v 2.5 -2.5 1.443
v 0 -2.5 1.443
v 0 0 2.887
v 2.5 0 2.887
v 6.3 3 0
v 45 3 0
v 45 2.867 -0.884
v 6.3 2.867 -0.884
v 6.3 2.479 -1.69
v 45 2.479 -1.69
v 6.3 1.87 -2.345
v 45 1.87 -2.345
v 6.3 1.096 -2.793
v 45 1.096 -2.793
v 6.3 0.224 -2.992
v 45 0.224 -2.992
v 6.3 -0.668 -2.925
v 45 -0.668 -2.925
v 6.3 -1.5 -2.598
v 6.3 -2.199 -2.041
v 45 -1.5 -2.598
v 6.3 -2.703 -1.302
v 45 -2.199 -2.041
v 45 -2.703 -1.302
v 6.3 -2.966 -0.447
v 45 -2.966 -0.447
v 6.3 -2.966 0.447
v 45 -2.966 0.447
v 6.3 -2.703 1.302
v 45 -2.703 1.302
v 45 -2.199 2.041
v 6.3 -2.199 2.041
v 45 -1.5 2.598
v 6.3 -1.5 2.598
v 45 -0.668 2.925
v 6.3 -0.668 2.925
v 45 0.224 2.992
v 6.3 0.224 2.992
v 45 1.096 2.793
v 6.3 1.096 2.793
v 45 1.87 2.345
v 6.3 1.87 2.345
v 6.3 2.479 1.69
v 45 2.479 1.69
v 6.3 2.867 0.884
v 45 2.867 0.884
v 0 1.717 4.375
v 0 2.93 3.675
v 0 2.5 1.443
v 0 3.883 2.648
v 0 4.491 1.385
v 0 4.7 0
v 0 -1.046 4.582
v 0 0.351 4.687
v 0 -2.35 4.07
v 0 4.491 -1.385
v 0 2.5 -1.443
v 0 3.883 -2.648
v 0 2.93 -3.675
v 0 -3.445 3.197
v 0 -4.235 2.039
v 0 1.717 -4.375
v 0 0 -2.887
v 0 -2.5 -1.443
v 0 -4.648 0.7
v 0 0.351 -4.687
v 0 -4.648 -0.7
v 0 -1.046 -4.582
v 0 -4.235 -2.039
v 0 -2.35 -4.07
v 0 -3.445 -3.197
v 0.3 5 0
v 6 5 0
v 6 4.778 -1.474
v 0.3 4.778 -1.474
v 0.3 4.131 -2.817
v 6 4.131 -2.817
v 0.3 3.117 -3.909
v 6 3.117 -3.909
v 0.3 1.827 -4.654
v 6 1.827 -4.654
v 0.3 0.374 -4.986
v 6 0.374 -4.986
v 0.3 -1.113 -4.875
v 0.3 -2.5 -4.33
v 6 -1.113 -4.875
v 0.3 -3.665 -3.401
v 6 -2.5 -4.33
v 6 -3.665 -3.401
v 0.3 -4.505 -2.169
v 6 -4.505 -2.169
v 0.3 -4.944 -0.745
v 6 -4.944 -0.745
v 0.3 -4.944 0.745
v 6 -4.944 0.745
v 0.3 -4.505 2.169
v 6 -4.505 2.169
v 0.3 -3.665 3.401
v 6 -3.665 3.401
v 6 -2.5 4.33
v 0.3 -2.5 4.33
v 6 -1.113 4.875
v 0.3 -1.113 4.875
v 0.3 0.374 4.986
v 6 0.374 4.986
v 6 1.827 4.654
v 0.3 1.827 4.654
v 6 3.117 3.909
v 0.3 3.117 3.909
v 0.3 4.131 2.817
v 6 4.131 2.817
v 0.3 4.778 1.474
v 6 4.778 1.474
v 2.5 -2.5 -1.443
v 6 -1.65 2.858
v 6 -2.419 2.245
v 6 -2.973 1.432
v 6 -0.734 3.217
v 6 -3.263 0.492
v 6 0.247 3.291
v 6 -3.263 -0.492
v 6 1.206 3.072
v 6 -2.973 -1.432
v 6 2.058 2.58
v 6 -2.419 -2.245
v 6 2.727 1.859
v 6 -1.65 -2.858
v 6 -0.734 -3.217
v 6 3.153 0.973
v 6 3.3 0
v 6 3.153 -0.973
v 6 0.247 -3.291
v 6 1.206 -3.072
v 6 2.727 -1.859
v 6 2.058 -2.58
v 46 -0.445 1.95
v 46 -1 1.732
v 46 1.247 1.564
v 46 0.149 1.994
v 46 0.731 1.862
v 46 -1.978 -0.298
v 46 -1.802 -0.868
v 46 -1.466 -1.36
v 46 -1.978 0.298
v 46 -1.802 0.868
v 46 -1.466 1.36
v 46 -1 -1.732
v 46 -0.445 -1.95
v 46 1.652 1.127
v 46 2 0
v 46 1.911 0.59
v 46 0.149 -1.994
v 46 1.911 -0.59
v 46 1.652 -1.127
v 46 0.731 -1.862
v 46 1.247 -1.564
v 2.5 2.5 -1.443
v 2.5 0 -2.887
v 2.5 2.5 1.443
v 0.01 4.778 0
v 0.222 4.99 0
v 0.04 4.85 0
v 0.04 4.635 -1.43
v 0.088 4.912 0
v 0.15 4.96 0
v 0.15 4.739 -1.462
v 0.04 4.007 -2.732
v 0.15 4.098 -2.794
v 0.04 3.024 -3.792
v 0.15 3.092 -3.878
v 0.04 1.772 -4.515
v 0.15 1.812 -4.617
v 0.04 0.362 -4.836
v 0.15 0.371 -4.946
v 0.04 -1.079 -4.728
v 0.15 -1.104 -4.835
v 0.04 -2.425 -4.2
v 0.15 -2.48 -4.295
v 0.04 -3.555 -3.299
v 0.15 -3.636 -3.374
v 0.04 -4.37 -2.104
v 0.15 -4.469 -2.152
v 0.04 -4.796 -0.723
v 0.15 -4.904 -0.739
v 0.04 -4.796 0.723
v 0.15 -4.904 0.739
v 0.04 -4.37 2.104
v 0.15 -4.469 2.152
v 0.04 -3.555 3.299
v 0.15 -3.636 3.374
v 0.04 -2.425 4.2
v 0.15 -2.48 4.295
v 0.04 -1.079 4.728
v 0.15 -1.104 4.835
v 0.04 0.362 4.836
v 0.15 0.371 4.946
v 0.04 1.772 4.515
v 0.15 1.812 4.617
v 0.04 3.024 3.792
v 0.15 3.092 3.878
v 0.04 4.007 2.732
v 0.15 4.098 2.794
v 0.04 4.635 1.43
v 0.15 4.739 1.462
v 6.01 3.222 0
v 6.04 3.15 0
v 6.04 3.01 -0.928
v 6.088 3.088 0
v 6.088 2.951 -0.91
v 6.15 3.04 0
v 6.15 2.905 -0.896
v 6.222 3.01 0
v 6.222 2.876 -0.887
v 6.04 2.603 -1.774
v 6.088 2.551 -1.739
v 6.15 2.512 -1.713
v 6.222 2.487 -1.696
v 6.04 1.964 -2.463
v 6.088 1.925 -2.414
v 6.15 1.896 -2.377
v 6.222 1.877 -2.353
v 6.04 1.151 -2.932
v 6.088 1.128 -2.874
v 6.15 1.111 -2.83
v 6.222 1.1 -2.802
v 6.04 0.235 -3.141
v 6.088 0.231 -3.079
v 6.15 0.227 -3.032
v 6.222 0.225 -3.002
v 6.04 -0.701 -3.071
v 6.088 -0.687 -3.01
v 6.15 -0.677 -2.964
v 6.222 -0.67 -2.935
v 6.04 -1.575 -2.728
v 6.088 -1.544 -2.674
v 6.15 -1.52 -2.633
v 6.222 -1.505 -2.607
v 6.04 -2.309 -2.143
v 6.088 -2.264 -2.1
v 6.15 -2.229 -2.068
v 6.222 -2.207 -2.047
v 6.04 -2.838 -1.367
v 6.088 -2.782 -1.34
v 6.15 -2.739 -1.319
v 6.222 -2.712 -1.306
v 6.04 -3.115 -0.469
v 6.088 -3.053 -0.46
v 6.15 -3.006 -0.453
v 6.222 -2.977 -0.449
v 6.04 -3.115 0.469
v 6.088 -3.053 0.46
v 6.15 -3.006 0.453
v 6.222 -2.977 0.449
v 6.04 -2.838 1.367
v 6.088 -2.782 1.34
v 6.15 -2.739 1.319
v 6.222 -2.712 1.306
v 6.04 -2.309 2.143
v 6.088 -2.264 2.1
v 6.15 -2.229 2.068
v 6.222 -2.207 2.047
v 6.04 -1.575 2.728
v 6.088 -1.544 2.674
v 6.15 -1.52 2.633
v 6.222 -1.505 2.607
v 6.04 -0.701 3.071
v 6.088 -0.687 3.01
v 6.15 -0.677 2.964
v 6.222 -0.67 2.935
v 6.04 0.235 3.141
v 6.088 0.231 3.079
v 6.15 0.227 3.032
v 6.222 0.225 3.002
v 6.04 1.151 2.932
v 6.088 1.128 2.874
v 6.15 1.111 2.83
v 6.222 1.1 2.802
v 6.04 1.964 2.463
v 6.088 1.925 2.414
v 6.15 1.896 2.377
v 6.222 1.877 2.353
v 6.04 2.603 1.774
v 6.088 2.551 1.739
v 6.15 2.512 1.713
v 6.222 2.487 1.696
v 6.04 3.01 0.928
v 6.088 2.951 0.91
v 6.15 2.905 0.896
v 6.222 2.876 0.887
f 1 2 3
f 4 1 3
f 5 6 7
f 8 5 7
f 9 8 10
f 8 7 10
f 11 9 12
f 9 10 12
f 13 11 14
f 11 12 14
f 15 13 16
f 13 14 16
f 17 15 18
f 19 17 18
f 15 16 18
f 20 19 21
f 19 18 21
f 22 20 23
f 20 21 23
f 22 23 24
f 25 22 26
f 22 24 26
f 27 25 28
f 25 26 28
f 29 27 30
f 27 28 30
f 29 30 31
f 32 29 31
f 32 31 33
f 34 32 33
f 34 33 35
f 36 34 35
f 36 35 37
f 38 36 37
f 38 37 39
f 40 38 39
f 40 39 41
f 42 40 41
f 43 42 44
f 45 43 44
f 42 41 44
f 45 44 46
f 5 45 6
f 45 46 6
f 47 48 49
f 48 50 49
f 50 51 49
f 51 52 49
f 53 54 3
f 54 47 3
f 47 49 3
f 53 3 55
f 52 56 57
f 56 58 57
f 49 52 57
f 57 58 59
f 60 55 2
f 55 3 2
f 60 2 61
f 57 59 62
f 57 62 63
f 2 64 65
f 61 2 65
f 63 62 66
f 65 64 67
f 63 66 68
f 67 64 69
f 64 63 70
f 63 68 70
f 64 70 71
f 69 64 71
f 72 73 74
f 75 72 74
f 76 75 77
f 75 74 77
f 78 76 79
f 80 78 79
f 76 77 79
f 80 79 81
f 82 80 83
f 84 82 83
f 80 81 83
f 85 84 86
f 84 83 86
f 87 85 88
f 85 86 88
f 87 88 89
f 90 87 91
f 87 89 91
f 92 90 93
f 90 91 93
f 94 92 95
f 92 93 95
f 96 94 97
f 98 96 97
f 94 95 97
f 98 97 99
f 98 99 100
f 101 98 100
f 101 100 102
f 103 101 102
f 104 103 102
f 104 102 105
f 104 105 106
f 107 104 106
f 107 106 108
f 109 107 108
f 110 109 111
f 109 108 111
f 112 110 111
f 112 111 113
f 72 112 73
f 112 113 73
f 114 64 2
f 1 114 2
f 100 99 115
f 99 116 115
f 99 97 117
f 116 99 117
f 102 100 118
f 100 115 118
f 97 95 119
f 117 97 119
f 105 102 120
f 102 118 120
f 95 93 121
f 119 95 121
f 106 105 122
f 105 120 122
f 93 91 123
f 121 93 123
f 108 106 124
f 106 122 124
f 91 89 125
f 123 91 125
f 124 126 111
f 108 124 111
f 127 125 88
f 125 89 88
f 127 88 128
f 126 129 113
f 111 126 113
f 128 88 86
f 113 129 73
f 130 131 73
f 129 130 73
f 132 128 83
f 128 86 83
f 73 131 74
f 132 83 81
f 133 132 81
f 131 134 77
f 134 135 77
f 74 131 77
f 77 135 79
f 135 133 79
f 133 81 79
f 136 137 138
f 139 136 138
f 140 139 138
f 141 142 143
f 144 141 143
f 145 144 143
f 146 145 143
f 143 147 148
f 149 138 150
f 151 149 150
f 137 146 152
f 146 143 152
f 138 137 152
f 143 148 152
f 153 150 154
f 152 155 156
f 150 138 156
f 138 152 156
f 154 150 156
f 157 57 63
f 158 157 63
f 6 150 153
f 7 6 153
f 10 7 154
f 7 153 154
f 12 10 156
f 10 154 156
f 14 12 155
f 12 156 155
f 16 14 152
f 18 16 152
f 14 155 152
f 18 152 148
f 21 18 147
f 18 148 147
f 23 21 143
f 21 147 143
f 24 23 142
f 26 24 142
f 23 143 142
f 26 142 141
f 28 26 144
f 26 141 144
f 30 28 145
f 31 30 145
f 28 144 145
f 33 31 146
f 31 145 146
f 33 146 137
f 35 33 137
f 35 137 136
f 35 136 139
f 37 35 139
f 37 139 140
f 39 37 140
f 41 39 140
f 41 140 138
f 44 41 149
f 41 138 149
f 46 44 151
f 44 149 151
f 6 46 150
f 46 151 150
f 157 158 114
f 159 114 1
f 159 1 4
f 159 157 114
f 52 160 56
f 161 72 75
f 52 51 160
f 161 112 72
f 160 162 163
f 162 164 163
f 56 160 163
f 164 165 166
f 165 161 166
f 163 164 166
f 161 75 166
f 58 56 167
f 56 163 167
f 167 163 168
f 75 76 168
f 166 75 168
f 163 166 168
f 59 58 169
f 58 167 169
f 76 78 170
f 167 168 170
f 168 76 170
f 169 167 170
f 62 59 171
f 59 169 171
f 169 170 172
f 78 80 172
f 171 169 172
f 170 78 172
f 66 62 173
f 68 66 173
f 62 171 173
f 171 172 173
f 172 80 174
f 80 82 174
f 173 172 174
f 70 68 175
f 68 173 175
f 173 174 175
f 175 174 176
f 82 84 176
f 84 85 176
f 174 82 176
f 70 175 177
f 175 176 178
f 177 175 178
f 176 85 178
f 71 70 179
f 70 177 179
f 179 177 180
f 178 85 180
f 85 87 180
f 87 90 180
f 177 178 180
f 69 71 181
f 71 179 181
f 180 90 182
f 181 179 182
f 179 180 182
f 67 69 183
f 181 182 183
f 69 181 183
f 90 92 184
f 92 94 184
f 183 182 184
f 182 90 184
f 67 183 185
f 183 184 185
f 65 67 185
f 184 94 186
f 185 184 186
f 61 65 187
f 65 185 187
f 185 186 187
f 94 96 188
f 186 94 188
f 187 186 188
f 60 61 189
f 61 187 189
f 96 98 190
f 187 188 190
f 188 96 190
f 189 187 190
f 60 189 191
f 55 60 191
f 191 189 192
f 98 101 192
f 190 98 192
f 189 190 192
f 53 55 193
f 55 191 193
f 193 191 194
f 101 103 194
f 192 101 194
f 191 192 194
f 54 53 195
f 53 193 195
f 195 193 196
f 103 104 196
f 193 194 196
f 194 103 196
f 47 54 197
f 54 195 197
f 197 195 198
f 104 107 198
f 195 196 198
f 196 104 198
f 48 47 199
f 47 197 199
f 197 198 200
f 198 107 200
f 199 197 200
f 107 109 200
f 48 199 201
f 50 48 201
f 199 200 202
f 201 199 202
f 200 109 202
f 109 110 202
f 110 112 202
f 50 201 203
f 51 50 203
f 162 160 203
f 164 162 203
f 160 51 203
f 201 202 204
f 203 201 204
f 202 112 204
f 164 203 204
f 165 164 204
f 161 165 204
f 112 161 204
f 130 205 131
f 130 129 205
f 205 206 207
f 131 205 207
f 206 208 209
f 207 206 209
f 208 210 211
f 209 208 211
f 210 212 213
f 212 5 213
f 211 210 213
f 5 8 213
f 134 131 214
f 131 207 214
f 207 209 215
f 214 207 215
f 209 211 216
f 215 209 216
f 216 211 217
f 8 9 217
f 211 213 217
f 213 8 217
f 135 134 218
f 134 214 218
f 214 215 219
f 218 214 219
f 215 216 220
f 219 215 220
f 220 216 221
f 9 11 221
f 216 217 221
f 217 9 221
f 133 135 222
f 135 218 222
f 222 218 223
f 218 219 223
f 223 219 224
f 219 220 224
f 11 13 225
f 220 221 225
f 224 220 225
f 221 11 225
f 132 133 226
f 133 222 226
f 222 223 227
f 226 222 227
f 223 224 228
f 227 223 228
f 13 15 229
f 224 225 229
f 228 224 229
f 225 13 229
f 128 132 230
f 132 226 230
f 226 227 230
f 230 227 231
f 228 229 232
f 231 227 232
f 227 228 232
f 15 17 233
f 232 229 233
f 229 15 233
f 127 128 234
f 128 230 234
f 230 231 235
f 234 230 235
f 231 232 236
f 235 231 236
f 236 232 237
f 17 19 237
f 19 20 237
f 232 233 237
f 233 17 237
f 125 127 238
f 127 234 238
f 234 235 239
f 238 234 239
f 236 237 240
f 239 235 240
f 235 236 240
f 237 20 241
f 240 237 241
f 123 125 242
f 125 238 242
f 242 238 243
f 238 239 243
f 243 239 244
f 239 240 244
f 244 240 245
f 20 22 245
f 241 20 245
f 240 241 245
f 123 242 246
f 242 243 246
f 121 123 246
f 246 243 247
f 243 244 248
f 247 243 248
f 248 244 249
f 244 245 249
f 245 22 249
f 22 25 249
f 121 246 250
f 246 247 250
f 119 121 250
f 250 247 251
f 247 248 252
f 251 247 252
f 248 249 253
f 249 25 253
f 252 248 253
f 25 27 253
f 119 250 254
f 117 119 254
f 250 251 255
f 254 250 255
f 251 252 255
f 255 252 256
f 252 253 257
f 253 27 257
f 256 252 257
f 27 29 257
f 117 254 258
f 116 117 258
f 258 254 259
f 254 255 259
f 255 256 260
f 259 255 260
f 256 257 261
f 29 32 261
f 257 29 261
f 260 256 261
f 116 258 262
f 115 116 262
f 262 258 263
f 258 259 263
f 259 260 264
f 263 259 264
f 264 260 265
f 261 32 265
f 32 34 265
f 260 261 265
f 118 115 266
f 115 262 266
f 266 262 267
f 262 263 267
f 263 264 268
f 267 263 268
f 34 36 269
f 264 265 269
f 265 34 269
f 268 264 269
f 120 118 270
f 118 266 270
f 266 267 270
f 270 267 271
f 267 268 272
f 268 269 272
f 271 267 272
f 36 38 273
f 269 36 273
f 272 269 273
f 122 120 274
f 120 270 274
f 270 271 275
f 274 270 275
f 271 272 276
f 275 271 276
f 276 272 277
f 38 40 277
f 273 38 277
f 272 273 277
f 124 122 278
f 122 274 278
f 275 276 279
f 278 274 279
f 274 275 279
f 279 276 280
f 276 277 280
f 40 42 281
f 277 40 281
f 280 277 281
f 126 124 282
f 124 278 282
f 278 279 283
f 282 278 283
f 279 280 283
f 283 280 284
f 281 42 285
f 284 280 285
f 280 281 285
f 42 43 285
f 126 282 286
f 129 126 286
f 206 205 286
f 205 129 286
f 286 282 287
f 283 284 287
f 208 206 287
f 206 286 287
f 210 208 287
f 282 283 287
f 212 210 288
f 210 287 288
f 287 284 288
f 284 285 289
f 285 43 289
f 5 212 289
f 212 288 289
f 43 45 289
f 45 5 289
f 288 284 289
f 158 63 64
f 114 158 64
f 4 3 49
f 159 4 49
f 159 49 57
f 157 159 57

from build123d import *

# Parameters (mm, degrees)
CUT_EXTRUDE_1_DEPTH = 2.5
FILLET_1_R          = 0.3
CHAMFER_1_SIZE      = 1


with BuildPart() as part:
    # Эскиз1 → Повернуть1 (revolve)
    with BuildSketch(Plane.XY):
        Polygon((0, 0), (0, 5), (6, 5), (6, 3), (46, 3), (46, 0), align=None)
    revolve(axis=Axis((46, 0, 0), (-1, 0, 0)))

    # Эскиз2 → Вырез-Вытянуть1 (cut)
    with BuildSketch(Plane.ZY):
        Polygon((-1.443375673, 2.5), (-2.886751346, 0), (-1.443375673, -2.5), (1.443375673, -2.5), (2.886751346, 0), (1.443375673, 2.5), align=None)
    extrude(amount=-CUT_EXTRUDE_1_DEPTH, mode=Mode.SUBTRACT)

    # Скругление1
    fillet_1_edges = [part.edges().sort_by_distance(p)[0] for p in [
        (6, -3, 0),
        (0, -5, 0),
    ]]
    fillet(fillet_1_edges, radius=FILLET_1_R)

    # Фаска1
    chamfer_1_edges = [part.edges().sort_by_distance(p)[0] for p in [
        (46, -3, 0),
    ]]
    chamfer(chamfer_1_edges, length=CHAMFER_1_SIZE)


solid = part.part
